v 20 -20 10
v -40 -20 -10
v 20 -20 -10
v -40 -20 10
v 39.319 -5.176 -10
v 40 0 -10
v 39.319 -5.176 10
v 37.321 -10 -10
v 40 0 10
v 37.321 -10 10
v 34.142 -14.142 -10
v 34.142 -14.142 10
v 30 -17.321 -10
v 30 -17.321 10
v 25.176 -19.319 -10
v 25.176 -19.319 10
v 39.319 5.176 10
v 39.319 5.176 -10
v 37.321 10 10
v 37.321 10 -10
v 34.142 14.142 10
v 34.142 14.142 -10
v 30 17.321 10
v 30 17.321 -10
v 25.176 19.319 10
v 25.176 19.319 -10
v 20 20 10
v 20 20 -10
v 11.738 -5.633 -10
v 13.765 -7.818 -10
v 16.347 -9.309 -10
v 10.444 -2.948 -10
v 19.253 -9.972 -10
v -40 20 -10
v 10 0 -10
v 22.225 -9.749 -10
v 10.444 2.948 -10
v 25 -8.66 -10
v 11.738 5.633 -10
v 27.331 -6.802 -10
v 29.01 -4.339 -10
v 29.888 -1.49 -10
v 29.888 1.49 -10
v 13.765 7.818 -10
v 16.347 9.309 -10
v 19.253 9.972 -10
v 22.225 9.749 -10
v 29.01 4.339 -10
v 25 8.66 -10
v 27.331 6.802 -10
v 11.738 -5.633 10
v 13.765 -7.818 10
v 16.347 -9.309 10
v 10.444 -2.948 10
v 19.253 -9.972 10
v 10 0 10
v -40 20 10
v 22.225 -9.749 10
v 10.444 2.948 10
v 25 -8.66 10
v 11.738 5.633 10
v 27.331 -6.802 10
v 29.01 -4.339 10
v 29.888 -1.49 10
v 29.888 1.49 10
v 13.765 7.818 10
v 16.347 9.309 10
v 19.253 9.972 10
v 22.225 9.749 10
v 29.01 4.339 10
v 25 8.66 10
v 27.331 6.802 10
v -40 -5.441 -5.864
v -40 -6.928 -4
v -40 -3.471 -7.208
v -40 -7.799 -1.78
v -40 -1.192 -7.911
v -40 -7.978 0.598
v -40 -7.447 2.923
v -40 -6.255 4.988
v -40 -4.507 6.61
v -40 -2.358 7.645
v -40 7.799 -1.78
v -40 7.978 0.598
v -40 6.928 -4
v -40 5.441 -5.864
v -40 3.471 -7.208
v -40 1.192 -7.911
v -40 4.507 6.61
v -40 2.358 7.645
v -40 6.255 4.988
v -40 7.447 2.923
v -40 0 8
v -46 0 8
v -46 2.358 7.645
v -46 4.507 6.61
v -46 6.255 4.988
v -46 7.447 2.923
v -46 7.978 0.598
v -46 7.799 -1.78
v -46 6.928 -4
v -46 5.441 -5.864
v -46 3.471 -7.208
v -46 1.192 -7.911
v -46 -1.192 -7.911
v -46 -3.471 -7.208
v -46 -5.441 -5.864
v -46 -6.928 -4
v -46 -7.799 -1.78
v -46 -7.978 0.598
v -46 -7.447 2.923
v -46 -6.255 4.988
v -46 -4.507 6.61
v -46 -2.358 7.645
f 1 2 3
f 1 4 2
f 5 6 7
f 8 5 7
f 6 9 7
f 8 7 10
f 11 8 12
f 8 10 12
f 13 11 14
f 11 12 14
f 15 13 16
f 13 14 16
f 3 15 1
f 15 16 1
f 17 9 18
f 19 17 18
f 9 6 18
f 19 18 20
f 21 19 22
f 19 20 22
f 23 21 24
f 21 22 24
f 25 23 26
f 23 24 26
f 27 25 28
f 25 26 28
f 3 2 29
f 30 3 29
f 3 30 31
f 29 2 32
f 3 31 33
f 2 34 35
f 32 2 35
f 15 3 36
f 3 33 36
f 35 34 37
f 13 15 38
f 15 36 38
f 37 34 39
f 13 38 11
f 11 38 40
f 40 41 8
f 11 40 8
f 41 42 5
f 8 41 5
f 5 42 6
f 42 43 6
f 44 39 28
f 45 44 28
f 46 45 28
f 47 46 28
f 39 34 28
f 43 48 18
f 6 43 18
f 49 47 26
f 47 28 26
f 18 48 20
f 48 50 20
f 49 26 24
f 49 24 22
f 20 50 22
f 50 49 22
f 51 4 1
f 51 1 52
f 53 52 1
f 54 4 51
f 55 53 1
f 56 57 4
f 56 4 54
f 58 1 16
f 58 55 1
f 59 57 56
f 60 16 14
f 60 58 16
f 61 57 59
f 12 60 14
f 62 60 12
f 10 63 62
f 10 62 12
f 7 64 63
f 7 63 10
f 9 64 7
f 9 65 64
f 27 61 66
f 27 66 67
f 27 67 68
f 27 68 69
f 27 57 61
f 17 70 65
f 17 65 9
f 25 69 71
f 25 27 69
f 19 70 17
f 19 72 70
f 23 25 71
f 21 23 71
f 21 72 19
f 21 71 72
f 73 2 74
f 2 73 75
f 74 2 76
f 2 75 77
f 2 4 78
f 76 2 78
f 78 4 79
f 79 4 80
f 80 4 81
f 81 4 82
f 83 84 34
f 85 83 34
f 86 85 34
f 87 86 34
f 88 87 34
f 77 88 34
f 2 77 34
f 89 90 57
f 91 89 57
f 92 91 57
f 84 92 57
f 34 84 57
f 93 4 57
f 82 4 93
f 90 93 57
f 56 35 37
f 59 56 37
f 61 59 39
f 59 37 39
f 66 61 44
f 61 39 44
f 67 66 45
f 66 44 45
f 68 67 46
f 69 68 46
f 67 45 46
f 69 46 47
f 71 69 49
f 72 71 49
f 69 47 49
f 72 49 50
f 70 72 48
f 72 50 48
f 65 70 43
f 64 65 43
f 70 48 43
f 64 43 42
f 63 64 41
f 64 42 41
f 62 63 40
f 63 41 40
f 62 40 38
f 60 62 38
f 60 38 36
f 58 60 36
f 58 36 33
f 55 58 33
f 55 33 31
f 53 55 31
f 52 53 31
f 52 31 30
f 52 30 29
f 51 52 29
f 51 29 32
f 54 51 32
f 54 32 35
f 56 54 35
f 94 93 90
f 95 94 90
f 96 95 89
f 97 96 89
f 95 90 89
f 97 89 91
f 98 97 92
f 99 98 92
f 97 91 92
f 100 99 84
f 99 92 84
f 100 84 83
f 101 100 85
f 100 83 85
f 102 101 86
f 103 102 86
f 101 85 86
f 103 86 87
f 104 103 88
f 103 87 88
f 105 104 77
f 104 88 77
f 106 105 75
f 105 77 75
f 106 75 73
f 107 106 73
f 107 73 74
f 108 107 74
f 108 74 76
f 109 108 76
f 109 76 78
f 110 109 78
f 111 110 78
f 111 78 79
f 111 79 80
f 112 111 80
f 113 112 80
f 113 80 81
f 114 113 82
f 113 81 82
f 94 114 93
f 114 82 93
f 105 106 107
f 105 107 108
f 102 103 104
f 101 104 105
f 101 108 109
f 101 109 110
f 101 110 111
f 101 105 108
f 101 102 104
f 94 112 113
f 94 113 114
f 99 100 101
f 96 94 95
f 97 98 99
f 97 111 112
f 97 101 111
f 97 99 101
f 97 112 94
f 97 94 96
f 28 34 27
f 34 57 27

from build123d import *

# Parameters (mm, degrees)
SKETCH_2_W          = 80
SKETCH_2_H          = 40
EXTRUDE_1_DEPTH     = 10
FILLET_3_R          = 20
CUT_EXTRUDE_6_REACH = 50.99
SKETCH_8_R          = 10
SKETCH_9_R          = 8
EXTRUDE_2_DEPTH     = 6


with BuildPart() as part:
    # 草图2 → 凸台-拉伸1 (new, symmetric)
    with BuildSketch(Plane.XY):
        Rectangle(SKETCH_2_W, SKETCH_2_H)
    extrude(amount=EXTRUDE_1_DEPTH, both=True)

    # 圆角3
    fillet_3_edges = [part.edges().sort_by_distance(p)[0] for p in [
        (40, -20, 0),
        (40, 20, 0),
    ]]
    fillet(fillet_3_edges, radius=FILLET_3_R - 0.0001)  # a hair under: the kernel refuses the full size

    # 草图8 → 切除-拉伸6 (cut, up to next)
    with BuildSketch(Plane(origin=(0, 0, -10), x_dir=(-1, 0, 0), z_dir=(0, 0, -1)), mode=Mode.PRIVATE) as cut_extrude_6_sk1:
        with Locations((-20, 0)):
            Circle(SKETCH_8_R)
    cut_extrude_6_tool1 = extrude(cut_extrude_6_sk1.sketch, amount=-CUT_EXTRUDE_6_REACH, mode=Mode.PRIVATE) & part.part
    add(cut_extrude_6_tool1.solids().sort_by_distance((20, 0, -10))[0], mode=Mode.SUBTRACT)

    # 草图9 → 凸台-拉伸2 (add)
    with BuildSketch(Plane.ZY.offset(40)):
        Circle(SKETCH_9_R)
    extrude(amount=EXTRUDE_2_DEPTH)


solid = part.part
